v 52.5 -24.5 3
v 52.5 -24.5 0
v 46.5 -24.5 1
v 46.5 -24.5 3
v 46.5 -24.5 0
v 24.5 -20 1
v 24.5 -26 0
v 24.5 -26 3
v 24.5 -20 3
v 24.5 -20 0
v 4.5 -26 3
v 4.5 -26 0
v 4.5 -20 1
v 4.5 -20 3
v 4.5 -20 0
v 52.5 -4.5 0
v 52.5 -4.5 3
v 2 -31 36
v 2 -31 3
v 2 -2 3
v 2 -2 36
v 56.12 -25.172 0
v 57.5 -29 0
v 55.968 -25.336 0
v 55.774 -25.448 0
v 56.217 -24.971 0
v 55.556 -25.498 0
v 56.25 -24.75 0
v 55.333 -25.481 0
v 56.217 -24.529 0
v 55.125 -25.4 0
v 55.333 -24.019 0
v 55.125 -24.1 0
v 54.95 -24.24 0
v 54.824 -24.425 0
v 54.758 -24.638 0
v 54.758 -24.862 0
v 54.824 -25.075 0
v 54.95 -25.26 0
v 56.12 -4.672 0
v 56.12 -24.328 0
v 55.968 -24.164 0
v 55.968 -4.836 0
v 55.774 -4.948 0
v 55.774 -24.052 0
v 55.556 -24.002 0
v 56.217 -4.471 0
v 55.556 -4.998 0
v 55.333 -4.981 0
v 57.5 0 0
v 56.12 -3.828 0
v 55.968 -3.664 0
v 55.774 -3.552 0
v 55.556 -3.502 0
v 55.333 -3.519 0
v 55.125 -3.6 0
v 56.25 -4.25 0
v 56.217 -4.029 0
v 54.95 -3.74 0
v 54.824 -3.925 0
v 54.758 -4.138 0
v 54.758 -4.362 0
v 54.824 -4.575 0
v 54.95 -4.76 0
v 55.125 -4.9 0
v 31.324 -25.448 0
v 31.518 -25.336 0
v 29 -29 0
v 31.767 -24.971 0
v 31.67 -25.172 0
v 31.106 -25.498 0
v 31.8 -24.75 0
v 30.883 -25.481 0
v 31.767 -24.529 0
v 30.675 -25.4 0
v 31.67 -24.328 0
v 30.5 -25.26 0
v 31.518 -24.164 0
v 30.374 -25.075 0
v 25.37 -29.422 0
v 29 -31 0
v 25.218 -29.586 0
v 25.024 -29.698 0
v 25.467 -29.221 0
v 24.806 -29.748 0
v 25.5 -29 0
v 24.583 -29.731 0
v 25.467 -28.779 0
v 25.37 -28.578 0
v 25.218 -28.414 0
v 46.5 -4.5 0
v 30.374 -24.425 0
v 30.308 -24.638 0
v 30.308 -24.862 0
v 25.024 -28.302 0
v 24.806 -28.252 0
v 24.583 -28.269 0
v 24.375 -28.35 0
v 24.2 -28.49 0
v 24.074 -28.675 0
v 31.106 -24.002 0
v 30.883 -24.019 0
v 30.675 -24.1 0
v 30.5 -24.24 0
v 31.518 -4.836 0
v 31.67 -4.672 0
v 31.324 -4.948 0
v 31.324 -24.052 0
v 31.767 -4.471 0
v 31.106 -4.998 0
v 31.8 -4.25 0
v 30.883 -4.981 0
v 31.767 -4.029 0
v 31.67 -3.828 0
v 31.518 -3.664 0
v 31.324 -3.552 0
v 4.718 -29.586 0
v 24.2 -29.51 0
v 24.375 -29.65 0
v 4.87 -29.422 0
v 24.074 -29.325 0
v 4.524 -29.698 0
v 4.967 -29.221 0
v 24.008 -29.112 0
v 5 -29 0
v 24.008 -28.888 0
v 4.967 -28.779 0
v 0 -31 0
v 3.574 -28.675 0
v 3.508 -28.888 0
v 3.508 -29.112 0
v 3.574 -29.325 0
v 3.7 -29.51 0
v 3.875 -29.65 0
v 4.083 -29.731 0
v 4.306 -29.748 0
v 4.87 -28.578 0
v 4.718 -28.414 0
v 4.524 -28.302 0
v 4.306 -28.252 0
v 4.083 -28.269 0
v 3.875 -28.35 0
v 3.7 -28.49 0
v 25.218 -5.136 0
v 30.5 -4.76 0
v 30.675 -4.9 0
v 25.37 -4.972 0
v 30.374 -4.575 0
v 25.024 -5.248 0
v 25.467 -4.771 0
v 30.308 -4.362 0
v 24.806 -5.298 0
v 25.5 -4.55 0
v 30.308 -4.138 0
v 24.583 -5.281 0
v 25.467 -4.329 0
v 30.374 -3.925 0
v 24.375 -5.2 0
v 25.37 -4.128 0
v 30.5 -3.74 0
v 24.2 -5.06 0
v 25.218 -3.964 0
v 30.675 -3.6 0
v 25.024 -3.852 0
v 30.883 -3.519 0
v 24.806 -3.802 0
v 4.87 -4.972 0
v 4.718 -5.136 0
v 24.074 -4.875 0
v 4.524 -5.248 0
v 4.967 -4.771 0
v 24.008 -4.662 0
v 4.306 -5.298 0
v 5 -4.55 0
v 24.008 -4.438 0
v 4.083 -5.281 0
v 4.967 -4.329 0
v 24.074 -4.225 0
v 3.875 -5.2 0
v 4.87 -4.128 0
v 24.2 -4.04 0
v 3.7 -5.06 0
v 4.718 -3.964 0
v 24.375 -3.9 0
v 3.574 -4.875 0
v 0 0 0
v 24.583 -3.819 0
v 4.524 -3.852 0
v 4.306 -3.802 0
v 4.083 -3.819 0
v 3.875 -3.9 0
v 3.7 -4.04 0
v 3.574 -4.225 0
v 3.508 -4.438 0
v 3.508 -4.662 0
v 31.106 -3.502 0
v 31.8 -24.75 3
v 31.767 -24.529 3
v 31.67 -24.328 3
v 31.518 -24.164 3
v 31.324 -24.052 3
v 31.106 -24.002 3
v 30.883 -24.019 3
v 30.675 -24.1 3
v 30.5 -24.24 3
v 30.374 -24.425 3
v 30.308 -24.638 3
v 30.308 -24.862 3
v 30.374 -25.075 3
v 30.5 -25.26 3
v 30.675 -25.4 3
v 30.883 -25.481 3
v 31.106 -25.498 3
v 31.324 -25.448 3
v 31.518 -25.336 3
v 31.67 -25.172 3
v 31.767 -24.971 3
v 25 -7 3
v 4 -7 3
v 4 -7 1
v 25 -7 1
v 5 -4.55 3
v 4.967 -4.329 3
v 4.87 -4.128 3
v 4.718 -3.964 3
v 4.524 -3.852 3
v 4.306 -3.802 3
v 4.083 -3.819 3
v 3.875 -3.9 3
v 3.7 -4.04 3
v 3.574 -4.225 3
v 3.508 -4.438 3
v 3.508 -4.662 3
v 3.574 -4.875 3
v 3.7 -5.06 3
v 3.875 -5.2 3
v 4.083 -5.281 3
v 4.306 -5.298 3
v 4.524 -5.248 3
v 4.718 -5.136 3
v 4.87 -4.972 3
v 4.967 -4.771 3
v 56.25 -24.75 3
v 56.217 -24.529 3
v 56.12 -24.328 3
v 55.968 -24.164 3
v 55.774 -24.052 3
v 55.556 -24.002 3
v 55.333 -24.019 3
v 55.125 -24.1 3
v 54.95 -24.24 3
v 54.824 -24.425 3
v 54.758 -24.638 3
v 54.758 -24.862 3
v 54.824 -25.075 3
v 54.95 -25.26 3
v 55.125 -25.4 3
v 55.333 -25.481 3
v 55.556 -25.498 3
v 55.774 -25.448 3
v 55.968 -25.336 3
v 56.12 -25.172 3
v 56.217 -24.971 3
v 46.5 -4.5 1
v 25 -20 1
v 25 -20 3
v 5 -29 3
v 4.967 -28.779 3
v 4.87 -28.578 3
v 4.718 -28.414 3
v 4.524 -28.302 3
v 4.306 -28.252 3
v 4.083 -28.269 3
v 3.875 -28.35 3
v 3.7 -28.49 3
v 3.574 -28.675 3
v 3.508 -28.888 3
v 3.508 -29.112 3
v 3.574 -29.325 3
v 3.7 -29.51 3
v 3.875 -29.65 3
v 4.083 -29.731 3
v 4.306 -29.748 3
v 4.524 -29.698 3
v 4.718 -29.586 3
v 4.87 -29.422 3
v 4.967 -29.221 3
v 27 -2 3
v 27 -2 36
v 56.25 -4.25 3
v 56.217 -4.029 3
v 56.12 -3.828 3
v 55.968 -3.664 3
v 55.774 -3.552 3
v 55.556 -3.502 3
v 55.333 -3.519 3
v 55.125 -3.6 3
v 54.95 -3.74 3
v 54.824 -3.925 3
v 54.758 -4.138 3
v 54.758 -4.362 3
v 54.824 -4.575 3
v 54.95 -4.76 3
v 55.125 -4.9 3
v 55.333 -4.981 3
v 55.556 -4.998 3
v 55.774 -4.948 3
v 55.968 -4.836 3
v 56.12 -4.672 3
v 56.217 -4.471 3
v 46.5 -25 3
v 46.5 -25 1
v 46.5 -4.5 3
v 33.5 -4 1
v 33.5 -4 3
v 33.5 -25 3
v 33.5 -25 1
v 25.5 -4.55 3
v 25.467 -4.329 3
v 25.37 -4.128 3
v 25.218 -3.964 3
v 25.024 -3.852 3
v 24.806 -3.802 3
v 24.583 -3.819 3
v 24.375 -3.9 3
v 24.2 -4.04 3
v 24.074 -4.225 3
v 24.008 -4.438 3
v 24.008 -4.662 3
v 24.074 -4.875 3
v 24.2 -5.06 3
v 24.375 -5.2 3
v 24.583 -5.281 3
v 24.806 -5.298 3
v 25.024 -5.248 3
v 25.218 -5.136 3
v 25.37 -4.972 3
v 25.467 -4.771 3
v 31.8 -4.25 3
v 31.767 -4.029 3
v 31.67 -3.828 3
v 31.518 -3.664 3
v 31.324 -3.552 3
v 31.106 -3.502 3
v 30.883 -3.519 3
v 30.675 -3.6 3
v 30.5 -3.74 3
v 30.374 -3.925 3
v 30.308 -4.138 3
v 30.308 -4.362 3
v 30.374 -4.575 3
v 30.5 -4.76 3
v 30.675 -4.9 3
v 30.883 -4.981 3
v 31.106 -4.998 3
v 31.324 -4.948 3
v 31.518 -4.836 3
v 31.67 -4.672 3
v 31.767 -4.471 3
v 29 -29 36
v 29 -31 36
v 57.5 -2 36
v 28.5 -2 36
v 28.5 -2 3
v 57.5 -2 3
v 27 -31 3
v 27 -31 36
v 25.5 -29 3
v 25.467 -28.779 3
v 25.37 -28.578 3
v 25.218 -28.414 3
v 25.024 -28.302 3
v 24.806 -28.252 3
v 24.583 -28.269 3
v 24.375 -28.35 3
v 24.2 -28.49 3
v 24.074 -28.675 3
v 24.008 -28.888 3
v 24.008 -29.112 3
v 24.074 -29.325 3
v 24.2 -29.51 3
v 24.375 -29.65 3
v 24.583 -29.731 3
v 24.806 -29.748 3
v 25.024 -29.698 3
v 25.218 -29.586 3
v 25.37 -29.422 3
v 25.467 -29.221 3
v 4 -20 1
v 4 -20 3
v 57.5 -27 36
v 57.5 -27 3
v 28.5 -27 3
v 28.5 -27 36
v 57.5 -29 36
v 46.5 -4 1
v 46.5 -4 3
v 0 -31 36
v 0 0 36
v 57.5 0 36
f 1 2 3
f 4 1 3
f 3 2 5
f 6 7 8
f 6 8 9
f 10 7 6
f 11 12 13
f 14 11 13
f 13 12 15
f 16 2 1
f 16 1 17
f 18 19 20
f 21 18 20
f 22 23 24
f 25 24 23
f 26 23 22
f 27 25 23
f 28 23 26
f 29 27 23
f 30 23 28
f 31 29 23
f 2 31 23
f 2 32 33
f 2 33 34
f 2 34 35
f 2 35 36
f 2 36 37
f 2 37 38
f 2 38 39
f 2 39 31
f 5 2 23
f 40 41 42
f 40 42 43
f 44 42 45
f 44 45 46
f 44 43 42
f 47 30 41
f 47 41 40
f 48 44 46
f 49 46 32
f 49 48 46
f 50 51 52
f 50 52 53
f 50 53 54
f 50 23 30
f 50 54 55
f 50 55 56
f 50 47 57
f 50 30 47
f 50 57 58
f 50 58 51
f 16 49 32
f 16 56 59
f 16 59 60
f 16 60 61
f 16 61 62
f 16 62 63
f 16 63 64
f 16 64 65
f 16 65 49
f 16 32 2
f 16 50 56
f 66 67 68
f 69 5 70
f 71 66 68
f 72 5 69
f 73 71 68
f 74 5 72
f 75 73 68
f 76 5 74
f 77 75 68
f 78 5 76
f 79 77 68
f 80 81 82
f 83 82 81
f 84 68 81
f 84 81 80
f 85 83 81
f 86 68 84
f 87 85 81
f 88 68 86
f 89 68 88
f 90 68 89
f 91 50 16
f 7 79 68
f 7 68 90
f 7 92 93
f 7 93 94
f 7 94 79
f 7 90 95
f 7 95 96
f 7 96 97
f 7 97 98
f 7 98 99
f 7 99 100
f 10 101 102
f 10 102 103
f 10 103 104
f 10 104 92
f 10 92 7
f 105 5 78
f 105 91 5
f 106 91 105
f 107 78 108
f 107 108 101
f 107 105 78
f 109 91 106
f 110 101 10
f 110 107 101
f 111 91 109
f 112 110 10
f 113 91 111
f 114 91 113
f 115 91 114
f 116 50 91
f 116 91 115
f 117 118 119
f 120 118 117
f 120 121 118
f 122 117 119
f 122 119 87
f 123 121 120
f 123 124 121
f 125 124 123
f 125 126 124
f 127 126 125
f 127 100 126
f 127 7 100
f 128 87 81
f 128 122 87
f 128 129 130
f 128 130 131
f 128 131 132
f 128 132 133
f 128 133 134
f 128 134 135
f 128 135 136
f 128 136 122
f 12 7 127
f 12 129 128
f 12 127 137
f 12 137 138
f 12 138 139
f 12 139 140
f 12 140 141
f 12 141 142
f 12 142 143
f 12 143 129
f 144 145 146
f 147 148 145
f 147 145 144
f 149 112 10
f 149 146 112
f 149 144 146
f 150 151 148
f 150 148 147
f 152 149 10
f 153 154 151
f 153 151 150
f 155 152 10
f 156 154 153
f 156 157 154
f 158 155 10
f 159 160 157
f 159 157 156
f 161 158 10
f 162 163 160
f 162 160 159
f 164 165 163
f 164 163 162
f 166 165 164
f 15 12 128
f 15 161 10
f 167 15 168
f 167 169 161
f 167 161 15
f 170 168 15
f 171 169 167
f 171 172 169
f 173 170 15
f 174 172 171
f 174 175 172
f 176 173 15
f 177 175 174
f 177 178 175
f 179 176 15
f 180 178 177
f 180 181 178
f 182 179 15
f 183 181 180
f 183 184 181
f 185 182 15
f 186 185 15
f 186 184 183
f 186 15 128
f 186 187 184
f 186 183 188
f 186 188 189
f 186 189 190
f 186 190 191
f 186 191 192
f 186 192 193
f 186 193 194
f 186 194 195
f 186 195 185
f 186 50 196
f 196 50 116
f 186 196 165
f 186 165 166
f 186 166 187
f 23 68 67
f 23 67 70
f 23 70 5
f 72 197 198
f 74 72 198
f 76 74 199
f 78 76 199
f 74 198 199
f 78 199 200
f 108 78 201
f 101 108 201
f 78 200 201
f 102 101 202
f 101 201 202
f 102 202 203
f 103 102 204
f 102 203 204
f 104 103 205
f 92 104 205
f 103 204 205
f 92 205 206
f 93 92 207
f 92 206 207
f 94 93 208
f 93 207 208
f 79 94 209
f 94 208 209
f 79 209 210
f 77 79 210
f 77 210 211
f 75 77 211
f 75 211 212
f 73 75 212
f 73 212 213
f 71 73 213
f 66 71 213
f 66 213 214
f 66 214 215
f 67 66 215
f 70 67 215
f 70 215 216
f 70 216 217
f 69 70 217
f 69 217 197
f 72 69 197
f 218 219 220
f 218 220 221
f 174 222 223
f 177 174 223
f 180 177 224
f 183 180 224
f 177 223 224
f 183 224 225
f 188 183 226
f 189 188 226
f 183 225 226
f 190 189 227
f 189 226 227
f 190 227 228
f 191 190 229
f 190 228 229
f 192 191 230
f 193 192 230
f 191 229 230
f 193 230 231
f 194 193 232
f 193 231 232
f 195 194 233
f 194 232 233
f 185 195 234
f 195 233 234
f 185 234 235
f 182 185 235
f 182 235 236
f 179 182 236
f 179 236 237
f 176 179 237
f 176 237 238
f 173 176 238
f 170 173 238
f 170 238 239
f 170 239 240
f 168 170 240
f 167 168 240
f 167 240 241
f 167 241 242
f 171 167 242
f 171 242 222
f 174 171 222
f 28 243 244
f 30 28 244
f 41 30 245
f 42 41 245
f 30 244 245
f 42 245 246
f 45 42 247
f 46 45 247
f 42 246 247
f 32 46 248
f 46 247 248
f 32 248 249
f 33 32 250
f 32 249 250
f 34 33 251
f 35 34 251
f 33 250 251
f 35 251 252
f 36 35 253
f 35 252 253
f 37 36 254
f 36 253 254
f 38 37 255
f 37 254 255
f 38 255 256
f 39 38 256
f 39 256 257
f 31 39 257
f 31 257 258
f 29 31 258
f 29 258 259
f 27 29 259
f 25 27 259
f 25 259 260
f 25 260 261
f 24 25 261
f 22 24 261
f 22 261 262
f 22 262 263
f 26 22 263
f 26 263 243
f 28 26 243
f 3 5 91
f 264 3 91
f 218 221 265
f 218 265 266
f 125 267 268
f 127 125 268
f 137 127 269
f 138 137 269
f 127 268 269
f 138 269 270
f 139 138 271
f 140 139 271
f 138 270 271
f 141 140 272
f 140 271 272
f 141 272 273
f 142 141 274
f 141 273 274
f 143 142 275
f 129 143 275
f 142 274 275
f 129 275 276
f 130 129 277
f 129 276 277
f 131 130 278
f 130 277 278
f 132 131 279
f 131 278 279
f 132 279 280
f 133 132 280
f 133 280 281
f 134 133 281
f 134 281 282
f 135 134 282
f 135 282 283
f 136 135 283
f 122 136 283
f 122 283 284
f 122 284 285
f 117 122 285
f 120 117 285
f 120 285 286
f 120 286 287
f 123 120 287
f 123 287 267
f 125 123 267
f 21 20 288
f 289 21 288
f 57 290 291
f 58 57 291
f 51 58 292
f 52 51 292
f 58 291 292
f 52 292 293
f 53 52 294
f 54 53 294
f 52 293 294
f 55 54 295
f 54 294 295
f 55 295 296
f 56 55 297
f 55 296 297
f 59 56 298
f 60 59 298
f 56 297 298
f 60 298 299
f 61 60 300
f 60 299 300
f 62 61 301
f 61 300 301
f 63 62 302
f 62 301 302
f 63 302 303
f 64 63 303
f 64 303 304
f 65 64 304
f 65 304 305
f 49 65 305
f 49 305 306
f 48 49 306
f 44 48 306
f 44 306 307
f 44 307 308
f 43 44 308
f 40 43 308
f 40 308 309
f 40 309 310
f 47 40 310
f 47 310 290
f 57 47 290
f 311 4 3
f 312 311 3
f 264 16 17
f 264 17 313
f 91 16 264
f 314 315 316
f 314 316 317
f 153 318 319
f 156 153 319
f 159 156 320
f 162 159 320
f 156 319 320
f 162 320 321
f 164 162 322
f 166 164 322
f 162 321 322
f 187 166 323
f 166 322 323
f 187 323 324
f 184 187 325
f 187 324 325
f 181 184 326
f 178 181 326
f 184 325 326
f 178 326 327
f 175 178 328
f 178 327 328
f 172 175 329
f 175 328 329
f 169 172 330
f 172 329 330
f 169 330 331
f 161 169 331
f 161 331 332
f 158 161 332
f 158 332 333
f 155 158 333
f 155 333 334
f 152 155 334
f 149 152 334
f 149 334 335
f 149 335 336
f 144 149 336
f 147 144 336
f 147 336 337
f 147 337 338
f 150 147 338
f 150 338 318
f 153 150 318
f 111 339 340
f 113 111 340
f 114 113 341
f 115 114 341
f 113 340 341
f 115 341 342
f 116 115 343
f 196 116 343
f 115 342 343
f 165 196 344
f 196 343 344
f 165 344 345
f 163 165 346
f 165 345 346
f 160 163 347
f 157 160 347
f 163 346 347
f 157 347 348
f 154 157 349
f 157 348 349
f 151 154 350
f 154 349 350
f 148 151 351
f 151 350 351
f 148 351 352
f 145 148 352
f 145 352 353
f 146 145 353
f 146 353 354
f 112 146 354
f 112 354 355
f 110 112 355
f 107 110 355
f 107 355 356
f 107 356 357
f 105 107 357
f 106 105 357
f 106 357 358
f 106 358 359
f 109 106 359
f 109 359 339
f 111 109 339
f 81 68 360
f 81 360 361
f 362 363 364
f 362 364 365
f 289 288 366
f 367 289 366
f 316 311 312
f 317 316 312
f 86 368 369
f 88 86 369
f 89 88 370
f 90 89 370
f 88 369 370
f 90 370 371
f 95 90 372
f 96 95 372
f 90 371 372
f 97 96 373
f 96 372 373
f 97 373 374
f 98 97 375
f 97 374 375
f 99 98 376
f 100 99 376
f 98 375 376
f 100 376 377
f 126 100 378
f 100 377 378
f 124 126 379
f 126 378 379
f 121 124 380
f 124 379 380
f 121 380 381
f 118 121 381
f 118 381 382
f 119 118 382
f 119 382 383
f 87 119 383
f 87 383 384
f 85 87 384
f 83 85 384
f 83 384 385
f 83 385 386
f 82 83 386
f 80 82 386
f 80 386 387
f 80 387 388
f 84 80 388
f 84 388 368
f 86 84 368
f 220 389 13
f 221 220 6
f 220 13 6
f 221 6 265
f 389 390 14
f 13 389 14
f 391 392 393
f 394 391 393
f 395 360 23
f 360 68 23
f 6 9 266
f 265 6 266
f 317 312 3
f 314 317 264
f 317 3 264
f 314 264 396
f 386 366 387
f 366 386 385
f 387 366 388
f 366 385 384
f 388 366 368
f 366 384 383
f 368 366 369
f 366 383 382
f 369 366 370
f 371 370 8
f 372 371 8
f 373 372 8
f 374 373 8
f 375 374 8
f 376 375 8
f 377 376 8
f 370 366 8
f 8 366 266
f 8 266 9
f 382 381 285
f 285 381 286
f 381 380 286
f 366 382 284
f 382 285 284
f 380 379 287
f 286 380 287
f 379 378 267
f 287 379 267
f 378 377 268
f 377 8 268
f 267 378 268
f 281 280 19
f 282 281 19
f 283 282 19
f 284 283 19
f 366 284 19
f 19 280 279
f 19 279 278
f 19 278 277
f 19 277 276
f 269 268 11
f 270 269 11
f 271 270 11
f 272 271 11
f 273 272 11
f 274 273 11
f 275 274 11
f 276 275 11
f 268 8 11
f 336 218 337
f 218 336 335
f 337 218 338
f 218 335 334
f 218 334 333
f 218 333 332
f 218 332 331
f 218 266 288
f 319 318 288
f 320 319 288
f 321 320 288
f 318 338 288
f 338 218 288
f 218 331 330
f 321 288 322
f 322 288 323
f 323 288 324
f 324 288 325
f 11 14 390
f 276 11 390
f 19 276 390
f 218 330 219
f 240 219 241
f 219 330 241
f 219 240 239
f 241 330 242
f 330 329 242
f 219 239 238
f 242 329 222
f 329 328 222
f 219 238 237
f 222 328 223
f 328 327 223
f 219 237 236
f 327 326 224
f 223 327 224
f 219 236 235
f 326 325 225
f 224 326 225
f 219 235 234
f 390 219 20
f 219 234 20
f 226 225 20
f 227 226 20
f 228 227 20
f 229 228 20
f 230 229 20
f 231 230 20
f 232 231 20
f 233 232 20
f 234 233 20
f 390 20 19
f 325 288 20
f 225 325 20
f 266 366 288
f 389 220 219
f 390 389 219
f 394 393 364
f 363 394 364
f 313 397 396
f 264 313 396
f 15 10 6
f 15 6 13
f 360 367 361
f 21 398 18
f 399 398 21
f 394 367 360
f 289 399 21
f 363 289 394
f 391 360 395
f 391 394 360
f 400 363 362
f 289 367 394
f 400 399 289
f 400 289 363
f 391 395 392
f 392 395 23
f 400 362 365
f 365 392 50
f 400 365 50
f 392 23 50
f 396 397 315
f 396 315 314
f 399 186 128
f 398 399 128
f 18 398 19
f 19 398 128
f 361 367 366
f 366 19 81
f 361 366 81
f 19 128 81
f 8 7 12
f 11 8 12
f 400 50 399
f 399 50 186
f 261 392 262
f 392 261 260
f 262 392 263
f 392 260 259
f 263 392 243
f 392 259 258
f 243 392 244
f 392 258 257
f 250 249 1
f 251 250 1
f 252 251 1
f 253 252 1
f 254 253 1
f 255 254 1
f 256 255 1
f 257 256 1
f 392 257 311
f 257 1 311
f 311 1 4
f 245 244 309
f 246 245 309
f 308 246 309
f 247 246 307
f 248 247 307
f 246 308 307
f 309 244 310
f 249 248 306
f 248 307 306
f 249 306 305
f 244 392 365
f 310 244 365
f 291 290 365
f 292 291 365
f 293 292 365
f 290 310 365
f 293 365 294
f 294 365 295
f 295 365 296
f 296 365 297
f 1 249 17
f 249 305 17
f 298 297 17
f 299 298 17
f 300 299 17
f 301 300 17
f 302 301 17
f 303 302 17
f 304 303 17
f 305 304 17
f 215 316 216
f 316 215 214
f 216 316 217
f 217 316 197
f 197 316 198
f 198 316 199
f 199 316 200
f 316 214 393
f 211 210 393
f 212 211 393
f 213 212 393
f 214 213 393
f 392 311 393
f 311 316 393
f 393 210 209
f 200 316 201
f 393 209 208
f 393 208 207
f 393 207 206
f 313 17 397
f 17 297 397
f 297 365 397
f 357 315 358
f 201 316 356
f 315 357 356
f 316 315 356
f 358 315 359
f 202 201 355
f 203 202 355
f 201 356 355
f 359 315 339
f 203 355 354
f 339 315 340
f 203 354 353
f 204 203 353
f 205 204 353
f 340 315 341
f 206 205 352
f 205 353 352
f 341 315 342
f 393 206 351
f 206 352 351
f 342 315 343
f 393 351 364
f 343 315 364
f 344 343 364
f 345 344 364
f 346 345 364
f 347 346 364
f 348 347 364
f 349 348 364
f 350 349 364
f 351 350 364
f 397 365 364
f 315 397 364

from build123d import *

# Parameters (mm, degrees)
EXTRUDE_1_DEPTH     = 3
CUT_EXTRUDE_1_REACH = 67.393
SKETCH_2_R          = 0.75
CUT_EXTRUDE_3_REACH = 67.393
SKETCH_4_W          = 20
SKETCH_4_H          = 6
CUT_EXTRUDE_4_REACH = 67.393
SKETCH_5_W          = 6
SKETCH_5_H          = 20
SKETCH_7_W          = 21
SKETCH_7_H          = 2
CUT_EXTRUDE_6_DEPTH = 13
SKETCH_8_W          = 2
SKETCH_8_H          = 21
CUT_EXTRUDE_7_DEPTH = 13
SKETCH_9_W          = 1.5
SKETCH_9_H          = 25
EXTRUDE_2_DEPTH     = 33


with BuildPart() as part:
    # 草图1 → 凸台-拉伸1 (new body)
    with BuildSketch(Plane.XY):
        Polygon((0, 0), (57.5, 0), (57.5, -29), (29, -29), (29, -31), (0, -31), align=None)
    extrude(amount=EXTRUDE_1_DEPTH)

    # 草图2 → 切除-拉伸1 (cut, up to next)
    with BuildSketch(Plane.XY.offset(3), mode=Mode.PRIVATE) as cut_extrude_1_sk1:
        with Locations((31.05, -4.25)):
            Circle(SKETCH_2_R)
    cut_extrude_1_tool1 = extrude(cut_extrude_1_sk1.sketch, amount=-CUT_EXTRUDE_1_REACH, mode=Mode.PRIVATE) & part.part
    # 草图2 → 切除-拉伸1 (cut, up to next)
    with BuildSketch(Plane.XY.offset(3), mode=Mode.PRIVATE) as cut_extrude_1_sk2:
        with Locations((55.5, -4.25)):
            Circle(SKETCH_2_R)
    cut_extrude_1_tool2 = extrude(cut_extrude_1_sk2.sketch, amount=-CUT_EXTRUDE_1_REACH, mode=Mode.PRIVATE) & part.part
    # 草图2 → 切除-拉伸1 (cut, up to next)
    with BuildSketch(Plane.XY.offset(3), mode=Mode.PRIVATE) as cut_extrude_1_sk3:
        with Locations((31.05, -24.75)):
            Circle(SKETCH_2_R)
    cut_extrude_1_tool3 = extrude(cut_extrude_1_sk3.sketch, amount=-CUT_EXTRUDE_1_REACH, mode=Mode.PRIVATE) & part.part
    # 草图2 → 切除-拉伸1 (cut, up to next)
    with BuildSketch(Plane.XY.offset(3), mode=Mode.PRIVATE) as cut_extrude_1_sk4:
        with Locations((55.5, -24.75)):
            Circle(SKETCH_2_R)
    cut_extrude_1_tool4 = extrude(cut_extrude_1_sk4.sketch, amount=-CUT_EXTRUDE_1_REACH, mode=Mode.PRIVATE) & part.part
    # 草图2 → 切除-拉伸1 (cut, up to next)
    with BuildSketch(Plane.XY.offset(3), mode=Mode.PRIVATE) as cut_extrude_1_sk5:
        with Locations((4.25, -29)):
            Circle(SKETCH_2_R)
    cut_extrude_1_tool5 = extrude(cut_extrude_1_sk5.sketch, amount=-CUT_EXTRUDE_1_REACH, mode=Mode.PRIVATE) & part.part
    # 草图2 → 切除-拉伸1 (cut, up to next)
    with BuildSketch(Plane.XY.offset(3), mode=Mode.PRIVATE) as cut_extrude_1_sk6:
        with Locations((24.75, -29)):
            Circle(SKETCH_2_R)
    cut_extrude_1_tool6 = extrude(cut_extrude_1_sk6.sketch, amount=-CUT_EXTRUDE_1_REACH, mode=Mode.PRIVATE) & part.part
    # 草图2 → 切除-拉伸1 (cut, up to next)
    with BuildSketch(Plane.XY.offset(3), mode=Mode.PRIVATE) as cut_extrude_1_sk7:
        with Locations((4.25, -4.55)):
            Circle(SKETCH_2_R)
    cut_extrude_1_tool7 = extrude(cut_extrude_1_sk7.sketch, amount=-CUT_EXTRUDE_1_REACH, mode=Mode.PRIVATE) & part.part
    # 草图2 → 切除-拉伸1 (cut, up to next)
    with BuildSketch(Plane.XY.offset(3), mode=Mode.PRIVATE) as cut_extrude_1_sk8:
        with Locations((24.75, -4.55)):
            Circle(SKETCH_2_R)
    cut_extrude_1_tool8 = extrude(cut_extrude_1_sk8.sketch, amount=-CUT_EXTRUDE_1_REACH, mode=Mode.PRIVATE) & part.part
    add(cut_extrude_1_tool1.solids().sort_by_distance((31.05, -4.25, 3))[0], mode=Mode.SUBTRACT)
    add(cut_extrude_1_tool2.solids().sort_by_distance((55.5, -4.25, 3))[0], mode=Mode.SUBTRACT)
    add(cut_extrude_1_tool3.solids().sort_by_distance((31.05, -24.75, 3))[0], mode=Mode.SUBTRACT)
    add(cut_extrude_1_tool4.solids().sort_by_distance((55.5, -24.75, 3))[0], mode=Mode.SUBTRACT)
    add(cut_extrude_1_tool5.solids().sort_by_distance((4.25, -29, 3))[0], mode=Mode.SUBTRACT)
    add(cut_extrude_1_tool6.solids().sort_by_distance((24.75, -29, 3))[0], mode=Mode.SUBTRACT)
    add(cut_extrude_1_tool7.solids().sort_by_distance((4.25, -4.55, 3))[0], mode=Mode.SUBTRACT)
    add(cut_extrude_1_tool8.solids().sort_by_distance((24.75, -4.55, 3))[0], mode=Mode.SUBTRACT)

    # 草图4 → 切除-拉伸3 (cut, up to next)
    with BuildSketch(Plane(origin=(0, 0, 0), x_dir=(-1, 0, 0), z_dir=(0, 0, -1)), mode=Mode.PRIVATE) as cut_extrude_3_sk1:
        with Locations((-14.5, -23)):
            Rectangle(SKETCH_4_W, SKETCH_4_H)
    cut_extrude_3_tool1 = extrude(cut_extrude_3_sk1.sketch, amount=-CUT_EXTRUDE_3_REACH, mode=Mode.PRIVATE) & part.part
    add(cut_extrude_3_tool1.solids().sort_by_distance((14.5, -23, 0))[0], mode=Mode.SUBTRACT)

    # 草图5 → 切除-拉伸4 (cut, up to next)
    with BuildSketch(Plane(origin=(0, 0, 0), x_dir=(-1, 0, 0), z_dir=(0, 0, -1)), mode=Mode.PRIVATE) as cut_extrude_4_sk1:
        with Locations((-49.5, -14.5)):
            Rectangle(SKETCH_5_W, SKETCH_5_H)
    cut_extrude_4_tool1 = extrude(cut_extrude_4_sk1.sketch, amount=-CUT_EXTRUDE_4_REACH, mode=Mode.PRIVATE) & part.part
    add(cut_extrude_4_tool1.solids().sort_by_distance((49.5, -14.5, 0))[0], mode=Mode.SUBTRACT)

    # 草图7 → 切除-拉伸6 (cut)
    with BuildSketch(Plane.XZ.offset(20)):
        with Locations((14.5, 2)):
            Rectangle(SKETCH_7_W, SKETCH_7_H)
    extrude(amount=-CUT_EXTRUDE_6_DEPTH, mode=Mode.SUBTRACT)

    # 草图8 → 切除-拉伸7 (cut)
    with BuildSketch(Plane(origin=(46.5, 0, 0), x_dir=(0, 0, -1), z_dir=(1, 0, 0))):
        with Locations((-2, -14.5)):
            Rectangle(SKETCH_8_W, SKETCH_8_H)
    extrude(amount=-CUT_EXTRUDE_7_DEPTH, mode=Mode.SUBTRACT)

    # 草图9 → 凸台-拉伸2 (add)
    with BuildSketch(Plane.XY.offset(3)):
        Polygon((0, -31), (2, -31), (2, -2), (27, -2), (28.5, -2), (57.5, -2), (57.5, 0), (0, 0), align=None)
        with Locations((27.75, -14.5)):
            Rectangle(SKETCH_9_W, SKETCH_9_H)
        Polygon((27, -27), (27, -31), (29, -31), (29, -29), (57.5, -29), (57.5, -27), (28.5, -27), align=None)
    extrude(amount=EXTRUDE_2_DEPTH)


solid = part.part
